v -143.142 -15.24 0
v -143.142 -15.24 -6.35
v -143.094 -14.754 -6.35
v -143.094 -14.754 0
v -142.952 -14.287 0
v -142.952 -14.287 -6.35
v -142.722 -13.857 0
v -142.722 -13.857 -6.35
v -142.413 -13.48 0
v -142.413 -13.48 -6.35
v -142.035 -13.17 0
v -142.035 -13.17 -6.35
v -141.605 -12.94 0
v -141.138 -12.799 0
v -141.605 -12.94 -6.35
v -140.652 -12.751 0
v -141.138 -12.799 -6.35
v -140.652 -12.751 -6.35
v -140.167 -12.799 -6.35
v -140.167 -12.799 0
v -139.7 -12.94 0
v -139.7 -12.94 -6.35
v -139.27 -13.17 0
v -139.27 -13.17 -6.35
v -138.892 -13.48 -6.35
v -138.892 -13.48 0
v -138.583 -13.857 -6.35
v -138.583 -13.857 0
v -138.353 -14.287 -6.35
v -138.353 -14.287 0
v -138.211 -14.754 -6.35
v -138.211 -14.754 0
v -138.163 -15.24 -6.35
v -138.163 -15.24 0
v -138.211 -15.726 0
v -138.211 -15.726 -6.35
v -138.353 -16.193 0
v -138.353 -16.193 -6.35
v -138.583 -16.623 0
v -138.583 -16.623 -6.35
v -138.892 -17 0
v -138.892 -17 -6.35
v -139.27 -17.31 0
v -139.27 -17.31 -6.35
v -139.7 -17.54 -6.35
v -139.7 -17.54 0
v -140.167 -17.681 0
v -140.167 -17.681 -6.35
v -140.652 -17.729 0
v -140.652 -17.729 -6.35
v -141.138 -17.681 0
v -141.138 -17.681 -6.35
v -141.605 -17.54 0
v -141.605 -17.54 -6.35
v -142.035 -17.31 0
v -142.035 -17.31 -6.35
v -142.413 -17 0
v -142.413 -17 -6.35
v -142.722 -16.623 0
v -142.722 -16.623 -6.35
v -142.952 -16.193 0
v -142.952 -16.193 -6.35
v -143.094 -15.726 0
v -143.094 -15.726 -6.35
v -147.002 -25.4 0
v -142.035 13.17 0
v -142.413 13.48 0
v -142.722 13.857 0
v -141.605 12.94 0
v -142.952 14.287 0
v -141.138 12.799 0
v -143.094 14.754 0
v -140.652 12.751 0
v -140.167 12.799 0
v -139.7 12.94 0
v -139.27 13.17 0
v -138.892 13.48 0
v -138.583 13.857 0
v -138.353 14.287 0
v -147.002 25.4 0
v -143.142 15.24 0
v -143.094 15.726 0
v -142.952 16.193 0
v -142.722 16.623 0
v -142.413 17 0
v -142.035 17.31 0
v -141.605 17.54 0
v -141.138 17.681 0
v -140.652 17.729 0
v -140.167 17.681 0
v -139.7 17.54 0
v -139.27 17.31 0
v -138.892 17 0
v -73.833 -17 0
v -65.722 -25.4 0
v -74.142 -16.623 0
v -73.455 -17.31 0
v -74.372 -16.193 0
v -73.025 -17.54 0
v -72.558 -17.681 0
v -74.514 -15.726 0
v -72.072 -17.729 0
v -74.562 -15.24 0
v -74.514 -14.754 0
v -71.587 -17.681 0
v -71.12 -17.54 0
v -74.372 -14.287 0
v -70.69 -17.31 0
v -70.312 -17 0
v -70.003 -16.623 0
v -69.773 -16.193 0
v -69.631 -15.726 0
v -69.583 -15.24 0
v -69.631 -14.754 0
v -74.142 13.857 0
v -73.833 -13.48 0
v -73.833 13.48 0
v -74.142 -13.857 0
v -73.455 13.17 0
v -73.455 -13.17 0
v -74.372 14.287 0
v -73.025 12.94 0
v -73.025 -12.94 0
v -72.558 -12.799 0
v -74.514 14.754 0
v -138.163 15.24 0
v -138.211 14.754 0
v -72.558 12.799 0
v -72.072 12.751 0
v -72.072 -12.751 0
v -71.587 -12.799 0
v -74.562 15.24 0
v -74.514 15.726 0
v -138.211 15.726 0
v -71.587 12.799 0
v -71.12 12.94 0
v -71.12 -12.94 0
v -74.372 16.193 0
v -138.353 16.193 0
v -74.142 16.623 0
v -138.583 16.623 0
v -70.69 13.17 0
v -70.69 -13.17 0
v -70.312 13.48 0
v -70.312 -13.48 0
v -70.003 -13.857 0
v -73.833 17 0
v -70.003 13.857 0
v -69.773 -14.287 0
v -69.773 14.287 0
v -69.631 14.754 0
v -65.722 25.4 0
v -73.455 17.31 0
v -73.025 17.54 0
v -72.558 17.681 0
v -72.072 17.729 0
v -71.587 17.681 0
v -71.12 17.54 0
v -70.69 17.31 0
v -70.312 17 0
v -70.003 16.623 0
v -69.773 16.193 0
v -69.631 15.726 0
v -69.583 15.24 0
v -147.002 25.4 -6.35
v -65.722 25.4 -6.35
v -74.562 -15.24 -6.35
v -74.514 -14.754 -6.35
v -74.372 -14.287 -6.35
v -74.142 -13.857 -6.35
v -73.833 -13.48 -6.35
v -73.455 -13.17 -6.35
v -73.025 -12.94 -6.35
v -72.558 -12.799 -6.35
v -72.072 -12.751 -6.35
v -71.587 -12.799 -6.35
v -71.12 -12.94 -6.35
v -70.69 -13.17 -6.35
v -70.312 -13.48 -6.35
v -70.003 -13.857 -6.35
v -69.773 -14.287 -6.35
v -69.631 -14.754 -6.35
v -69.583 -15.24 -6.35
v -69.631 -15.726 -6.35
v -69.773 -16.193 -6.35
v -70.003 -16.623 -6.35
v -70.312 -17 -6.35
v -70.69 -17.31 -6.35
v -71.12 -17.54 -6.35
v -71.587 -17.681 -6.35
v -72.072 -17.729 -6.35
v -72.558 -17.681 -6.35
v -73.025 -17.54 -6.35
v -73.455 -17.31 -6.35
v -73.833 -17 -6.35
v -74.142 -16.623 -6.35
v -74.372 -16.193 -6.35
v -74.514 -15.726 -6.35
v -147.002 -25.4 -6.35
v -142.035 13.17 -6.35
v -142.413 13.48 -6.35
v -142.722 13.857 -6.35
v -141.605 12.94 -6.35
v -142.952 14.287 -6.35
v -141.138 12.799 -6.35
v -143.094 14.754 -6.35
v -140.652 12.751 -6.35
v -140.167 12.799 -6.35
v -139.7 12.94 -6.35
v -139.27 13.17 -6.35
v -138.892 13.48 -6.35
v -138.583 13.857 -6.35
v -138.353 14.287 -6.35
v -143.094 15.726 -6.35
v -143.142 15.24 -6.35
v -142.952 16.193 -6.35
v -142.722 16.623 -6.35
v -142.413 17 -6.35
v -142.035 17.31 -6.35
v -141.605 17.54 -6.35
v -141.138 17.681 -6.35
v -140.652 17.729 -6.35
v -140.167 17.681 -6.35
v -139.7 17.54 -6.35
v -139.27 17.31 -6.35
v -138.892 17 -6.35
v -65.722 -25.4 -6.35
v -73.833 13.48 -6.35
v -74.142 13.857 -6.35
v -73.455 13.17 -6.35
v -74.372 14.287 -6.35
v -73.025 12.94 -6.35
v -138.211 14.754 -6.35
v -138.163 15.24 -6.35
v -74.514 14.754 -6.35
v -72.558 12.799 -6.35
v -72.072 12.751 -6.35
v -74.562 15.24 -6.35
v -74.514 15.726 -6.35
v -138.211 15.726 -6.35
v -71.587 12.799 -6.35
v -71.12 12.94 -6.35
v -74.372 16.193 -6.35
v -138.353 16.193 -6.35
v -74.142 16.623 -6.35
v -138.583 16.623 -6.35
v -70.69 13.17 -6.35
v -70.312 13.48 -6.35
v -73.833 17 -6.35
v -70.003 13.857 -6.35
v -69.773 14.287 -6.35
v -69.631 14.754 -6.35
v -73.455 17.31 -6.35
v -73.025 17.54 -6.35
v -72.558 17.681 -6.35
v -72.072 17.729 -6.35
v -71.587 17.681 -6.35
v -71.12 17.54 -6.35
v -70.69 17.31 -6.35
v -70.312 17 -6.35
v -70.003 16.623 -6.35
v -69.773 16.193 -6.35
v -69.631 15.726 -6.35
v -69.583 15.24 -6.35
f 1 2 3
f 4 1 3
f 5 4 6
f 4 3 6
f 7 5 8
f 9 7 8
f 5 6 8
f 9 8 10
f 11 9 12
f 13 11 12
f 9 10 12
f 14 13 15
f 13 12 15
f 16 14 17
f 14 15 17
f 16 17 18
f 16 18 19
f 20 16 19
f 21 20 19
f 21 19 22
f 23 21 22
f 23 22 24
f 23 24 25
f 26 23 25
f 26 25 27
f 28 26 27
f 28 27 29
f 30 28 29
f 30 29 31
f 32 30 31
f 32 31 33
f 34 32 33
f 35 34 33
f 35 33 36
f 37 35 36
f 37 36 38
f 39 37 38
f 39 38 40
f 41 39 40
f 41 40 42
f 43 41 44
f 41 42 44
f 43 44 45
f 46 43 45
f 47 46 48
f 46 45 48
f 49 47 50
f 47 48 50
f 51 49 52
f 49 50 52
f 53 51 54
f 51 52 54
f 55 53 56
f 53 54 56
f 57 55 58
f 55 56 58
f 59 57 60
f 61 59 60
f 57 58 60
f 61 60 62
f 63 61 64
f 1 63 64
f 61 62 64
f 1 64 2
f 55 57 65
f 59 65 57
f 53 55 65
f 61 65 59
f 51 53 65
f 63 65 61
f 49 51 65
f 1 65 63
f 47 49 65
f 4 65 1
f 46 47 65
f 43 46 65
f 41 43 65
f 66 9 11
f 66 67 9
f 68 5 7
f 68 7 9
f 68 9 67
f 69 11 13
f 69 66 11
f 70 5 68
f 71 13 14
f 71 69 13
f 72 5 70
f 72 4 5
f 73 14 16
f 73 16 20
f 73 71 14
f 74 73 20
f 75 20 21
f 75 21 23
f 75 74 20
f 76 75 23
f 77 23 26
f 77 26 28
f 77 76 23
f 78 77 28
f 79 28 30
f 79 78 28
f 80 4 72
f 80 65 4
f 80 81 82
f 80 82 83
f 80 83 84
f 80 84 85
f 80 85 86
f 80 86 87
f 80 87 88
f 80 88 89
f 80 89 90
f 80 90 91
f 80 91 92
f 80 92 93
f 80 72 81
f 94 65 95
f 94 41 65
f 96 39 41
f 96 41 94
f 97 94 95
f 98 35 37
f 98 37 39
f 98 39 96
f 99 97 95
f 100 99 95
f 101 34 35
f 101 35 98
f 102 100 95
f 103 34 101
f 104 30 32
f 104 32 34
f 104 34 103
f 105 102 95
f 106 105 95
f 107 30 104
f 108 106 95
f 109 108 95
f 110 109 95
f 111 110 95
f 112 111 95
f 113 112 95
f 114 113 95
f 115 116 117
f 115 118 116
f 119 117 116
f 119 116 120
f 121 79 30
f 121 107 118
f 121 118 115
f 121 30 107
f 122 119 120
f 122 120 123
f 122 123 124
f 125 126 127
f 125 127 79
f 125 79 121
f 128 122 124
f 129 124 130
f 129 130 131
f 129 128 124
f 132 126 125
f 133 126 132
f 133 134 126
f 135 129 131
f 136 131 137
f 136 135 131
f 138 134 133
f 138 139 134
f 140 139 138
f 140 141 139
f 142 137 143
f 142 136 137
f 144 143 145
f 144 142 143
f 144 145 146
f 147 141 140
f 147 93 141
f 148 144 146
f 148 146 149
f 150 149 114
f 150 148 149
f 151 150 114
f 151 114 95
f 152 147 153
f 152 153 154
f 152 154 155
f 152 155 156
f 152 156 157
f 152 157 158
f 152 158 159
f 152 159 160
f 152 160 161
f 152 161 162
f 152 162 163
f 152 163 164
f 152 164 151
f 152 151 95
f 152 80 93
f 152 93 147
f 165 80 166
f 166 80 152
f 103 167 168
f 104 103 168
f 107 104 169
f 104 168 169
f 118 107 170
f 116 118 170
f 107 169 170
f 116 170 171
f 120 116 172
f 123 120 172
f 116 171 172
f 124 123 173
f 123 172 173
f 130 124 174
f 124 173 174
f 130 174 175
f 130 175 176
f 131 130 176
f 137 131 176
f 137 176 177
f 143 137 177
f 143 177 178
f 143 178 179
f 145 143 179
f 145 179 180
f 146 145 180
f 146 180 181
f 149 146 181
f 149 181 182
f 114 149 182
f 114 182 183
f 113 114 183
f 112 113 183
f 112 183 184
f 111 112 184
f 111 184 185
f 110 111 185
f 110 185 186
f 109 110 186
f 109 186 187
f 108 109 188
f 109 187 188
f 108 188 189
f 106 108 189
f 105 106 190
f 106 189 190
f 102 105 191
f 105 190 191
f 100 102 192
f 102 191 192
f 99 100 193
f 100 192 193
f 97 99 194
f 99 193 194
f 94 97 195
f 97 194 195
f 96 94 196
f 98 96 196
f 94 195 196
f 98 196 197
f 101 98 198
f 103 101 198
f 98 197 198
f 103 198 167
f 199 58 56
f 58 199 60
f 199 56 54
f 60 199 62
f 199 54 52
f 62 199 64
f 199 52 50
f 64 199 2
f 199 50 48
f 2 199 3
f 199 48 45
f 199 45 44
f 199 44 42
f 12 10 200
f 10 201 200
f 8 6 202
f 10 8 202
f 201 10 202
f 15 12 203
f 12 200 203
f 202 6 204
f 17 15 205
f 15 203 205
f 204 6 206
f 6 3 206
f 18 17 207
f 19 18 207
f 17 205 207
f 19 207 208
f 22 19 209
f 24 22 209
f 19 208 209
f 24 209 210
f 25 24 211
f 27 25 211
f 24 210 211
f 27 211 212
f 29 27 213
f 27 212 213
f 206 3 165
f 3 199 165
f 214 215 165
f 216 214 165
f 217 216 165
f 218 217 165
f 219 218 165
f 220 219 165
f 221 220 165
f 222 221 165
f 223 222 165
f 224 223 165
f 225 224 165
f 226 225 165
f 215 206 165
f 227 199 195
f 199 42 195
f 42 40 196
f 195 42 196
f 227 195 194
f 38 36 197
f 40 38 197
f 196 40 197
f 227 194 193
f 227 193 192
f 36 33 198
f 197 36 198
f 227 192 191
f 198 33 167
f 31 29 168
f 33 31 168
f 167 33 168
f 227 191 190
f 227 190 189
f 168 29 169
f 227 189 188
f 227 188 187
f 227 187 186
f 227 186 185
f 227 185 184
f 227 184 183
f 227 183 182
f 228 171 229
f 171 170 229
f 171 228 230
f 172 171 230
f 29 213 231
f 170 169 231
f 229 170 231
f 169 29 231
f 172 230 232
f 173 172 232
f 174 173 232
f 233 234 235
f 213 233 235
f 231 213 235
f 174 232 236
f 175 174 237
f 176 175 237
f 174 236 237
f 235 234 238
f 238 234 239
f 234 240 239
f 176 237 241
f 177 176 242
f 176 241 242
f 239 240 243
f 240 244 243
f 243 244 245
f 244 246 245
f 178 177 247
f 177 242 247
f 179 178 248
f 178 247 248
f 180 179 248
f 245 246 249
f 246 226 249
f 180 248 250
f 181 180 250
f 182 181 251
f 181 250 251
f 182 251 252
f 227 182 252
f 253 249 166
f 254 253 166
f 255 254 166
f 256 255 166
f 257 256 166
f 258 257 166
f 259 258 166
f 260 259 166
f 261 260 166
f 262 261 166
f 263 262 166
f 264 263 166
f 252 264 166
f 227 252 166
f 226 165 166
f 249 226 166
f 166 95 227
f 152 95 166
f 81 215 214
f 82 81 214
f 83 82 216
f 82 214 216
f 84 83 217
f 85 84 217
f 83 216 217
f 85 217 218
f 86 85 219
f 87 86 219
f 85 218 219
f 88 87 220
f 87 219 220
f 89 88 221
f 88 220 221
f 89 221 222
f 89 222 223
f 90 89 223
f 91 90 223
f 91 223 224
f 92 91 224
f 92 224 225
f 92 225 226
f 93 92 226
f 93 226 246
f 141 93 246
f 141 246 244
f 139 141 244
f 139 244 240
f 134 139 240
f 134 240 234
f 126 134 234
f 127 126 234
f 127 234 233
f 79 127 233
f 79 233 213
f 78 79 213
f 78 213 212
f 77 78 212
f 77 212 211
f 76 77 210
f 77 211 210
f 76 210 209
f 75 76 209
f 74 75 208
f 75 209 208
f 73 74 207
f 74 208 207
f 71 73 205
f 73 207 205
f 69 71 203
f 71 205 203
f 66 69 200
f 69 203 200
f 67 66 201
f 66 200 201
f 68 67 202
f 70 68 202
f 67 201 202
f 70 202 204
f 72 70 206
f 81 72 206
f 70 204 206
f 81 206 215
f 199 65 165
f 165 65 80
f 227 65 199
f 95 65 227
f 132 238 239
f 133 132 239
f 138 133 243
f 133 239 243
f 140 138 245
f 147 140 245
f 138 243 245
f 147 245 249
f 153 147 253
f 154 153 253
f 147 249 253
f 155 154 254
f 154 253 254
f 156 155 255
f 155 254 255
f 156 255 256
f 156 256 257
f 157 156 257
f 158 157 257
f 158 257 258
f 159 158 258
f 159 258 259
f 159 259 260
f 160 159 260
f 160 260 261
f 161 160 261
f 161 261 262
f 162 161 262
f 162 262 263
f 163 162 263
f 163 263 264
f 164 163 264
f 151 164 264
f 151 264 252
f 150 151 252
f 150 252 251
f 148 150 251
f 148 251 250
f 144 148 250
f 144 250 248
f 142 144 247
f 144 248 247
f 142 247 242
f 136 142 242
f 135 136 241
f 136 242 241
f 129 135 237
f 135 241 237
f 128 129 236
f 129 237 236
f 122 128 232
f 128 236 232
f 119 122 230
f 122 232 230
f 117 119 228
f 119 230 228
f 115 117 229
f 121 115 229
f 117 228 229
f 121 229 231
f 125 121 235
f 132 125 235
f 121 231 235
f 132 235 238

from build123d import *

# Parameters (mm, degrees)
F0_W     = 81.28
F0_H     = 50.8
F1_DEPTH = 6.35
F2_D     = 4.9784


with BuildPart() as f1:
    # F0 (on Top) → F1 (new body)
    with BuildSketch(Plane.XY):
        with Locations((-106.3625, 0)):
            Rectangle(F0_W, F0_H)
    extrude(amount=-F1_DEPTH)

    # F2 (through all)
    with Locations(Plane.XY):
        with Locations((-140.6525, 15.24), (-140.6525, -15.24), (-72.0725, 15.24), (-72.0725, -15.24)):
            Hole(F2_D / 2)


solid = f1.part
